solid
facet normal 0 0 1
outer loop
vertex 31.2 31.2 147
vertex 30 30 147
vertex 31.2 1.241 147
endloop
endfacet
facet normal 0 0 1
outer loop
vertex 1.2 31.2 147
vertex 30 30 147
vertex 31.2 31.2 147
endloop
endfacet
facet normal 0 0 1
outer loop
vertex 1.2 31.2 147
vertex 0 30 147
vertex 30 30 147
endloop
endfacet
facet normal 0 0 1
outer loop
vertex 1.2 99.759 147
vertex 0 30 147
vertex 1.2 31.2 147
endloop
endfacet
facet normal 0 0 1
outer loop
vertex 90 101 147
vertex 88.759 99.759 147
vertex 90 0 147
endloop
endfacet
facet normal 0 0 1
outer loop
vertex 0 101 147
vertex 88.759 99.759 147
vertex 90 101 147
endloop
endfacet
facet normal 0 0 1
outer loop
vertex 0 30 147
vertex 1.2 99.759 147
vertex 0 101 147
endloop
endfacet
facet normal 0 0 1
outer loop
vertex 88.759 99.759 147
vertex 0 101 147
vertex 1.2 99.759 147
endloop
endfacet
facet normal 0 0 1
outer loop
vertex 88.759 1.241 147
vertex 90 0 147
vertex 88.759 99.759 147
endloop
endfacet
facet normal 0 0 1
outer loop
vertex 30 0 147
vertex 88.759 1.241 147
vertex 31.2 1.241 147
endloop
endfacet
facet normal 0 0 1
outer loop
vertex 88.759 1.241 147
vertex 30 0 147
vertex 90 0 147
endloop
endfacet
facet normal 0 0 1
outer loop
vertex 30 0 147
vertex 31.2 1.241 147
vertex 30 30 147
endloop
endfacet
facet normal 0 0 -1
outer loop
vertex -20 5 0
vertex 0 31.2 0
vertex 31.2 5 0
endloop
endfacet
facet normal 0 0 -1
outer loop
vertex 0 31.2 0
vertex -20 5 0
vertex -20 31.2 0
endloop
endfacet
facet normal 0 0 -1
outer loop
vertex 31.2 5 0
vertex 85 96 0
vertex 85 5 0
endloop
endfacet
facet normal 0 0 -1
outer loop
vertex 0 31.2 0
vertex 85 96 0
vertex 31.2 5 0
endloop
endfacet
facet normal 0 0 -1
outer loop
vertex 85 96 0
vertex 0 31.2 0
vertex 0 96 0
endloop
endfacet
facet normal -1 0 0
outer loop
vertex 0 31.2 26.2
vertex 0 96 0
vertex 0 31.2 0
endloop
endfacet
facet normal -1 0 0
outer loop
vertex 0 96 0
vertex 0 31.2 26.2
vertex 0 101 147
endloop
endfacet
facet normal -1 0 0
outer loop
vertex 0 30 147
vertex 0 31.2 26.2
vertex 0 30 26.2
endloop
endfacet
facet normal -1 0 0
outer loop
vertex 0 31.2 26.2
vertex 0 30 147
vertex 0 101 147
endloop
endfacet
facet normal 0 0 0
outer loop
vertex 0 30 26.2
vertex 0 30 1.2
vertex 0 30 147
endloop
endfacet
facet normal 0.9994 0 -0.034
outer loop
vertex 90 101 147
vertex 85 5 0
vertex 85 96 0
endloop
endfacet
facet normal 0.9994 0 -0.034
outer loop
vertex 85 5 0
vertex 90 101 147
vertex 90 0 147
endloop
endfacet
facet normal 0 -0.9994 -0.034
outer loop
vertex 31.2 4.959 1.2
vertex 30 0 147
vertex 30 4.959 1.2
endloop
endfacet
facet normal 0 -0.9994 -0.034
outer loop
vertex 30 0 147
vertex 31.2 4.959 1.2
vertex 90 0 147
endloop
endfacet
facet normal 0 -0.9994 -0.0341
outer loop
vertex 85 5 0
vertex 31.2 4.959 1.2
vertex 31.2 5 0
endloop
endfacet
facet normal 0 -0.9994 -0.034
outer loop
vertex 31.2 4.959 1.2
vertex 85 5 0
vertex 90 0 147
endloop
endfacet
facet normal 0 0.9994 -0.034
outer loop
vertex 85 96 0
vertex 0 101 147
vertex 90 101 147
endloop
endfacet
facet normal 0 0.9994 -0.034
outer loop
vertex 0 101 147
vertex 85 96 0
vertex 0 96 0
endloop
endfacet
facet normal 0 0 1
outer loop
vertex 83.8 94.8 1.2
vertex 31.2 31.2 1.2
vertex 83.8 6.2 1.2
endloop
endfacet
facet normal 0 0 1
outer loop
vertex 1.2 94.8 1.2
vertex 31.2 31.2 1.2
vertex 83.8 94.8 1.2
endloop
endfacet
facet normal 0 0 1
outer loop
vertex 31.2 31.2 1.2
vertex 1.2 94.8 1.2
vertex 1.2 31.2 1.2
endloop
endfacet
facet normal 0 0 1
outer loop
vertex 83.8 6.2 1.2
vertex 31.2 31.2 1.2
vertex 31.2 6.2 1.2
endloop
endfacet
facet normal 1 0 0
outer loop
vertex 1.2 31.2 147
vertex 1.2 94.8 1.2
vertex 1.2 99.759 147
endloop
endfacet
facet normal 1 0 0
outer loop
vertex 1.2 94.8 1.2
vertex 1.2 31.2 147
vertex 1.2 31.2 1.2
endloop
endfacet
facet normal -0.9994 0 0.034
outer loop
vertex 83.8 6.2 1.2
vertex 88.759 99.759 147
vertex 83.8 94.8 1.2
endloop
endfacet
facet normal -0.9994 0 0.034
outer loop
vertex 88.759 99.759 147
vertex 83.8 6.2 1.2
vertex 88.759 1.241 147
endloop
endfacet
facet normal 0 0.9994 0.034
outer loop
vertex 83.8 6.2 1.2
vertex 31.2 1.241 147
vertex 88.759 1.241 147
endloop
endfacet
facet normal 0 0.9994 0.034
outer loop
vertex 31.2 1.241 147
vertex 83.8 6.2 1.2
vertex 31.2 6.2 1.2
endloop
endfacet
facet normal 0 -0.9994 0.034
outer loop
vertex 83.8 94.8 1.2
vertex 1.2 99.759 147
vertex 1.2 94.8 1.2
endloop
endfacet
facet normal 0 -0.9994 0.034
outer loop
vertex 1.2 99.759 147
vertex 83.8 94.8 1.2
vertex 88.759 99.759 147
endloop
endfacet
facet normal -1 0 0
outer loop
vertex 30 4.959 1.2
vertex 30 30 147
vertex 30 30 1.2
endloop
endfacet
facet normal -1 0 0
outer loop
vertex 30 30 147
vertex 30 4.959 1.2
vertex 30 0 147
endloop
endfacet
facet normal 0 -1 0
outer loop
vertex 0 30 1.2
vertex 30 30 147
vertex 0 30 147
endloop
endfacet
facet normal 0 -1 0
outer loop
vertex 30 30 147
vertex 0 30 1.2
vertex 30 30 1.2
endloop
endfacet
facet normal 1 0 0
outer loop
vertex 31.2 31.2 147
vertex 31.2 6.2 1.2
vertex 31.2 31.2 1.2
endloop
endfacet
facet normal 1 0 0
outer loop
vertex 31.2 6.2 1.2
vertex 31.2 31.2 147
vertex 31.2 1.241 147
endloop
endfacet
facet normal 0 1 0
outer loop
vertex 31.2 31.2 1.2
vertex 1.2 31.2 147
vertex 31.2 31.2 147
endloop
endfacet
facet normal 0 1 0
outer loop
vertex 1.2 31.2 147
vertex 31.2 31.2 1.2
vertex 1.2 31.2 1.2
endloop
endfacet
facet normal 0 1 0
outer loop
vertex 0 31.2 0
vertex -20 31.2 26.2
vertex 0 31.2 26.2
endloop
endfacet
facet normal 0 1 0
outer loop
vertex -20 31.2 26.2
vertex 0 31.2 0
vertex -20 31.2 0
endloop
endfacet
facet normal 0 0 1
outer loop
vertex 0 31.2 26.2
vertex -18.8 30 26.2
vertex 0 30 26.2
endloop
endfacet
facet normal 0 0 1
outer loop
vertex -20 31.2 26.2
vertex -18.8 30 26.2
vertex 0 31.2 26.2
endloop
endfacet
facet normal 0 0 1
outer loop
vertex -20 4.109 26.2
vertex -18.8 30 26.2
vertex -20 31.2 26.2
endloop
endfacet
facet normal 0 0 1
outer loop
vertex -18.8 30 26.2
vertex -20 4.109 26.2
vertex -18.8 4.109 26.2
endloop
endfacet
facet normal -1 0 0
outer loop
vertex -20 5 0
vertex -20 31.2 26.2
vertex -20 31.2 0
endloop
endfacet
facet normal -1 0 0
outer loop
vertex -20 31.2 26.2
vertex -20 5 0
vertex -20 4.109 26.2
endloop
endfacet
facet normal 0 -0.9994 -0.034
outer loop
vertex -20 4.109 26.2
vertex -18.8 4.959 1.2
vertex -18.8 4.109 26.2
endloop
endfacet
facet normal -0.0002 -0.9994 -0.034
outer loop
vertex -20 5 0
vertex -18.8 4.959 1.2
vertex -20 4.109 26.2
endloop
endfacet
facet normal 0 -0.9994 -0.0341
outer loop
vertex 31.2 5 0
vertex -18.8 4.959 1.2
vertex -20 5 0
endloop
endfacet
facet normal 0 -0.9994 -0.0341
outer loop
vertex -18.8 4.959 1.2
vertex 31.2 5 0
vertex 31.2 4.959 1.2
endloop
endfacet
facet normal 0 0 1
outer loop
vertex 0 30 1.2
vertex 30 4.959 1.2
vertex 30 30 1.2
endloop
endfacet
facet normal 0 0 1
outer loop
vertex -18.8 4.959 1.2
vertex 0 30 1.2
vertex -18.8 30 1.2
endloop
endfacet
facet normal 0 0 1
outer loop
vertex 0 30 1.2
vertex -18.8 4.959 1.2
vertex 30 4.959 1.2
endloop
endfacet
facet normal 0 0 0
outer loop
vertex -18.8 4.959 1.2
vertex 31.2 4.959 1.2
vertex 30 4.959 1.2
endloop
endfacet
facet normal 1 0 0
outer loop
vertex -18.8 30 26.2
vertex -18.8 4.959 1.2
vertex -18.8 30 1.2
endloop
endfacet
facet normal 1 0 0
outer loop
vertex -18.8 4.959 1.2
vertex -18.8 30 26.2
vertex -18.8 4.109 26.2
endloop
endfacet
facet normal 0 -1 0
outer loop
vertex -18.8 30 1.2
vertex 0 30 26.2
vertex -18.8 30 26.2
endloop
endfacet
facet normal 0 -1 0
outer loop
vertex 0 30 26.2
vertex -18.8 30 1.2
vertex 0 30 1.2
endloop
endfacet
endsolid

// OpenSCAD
box_w_bottom=91;
//box_delta=10;
//box_w_top=box_w_bottom+box_delta*2;
box_w_top=101;
box_delta=(box_w_top-box_w_bottom)/2;
box_h=147;
box_l_bottom=85;
box_l_top=box_l_bottom+box_delta;
box_angle=atan(box_delta/box_h);
pad=0.1;
padd=pad*2;

gun_w=30;
gun_l_to_front=55;
gun_l=box_l_bottom-gun_l_to_front;

wall=1.2;

muzzle_w=gun_w-wall;
muzzle_l=50;
muzzle_h=25;


module angled_box(this_l,this_w,this_h) {
    difference() {
        cube([this_l,this_w,this_h]);
        //front angle
        translate([this_l-box_delta,-pad,0])
        rotate([0,box_angle,0])
        cube([box_delta*2,this_w+padd,this_h*2]);
        //near side
        translate([-pad,box_delta,0])
        rotate([box_angle,0,0])
        translate([0,-box_delta*2,0])
        cube([this_l+padd,box_delta*2,this_h*2]);
        //far side
        translate([-pad,this_w-box_delta,0])
        rotate([-box_angle,0,0])
        cube([this_l+padd,box_delta*2,this_h*2]);
    }
}

module gun(this_l,this_w,this_h) {
    difference() {
        cube([this_l,this_w,this_h]);
        //near side
        translate([-pad,box_delta,0])
        rotate([box_angle,0,0])
        translate([0,-box_delta*2,0])
        cube([this_l+padd,box_delta*2,this_h*2]);
    }
}

difference() {
    angled_box(box_l_top,box_w_top,box_h);
    translate([wall,wall,wall])
    angled_box(box_l_top-wall*2,box_w_top-wall*2,box_h-wall+pad);
    translate([-pad,-pad,-pad])
    gun(gun_l+pad,gun_w+pad,box_h+padd);
}
difference() {
    gun(gun_l+wall,gun_w+wall,box_h);
    translate([-pad,-pad,-pad])
    gun(gun_l+pad,gun_w+pad,box_h+padd);
}
translate([-muzzle_l+gun_l,0,0])
difference() {
    gun(muzzle_l+wall,muzzle_w+wall*2,muzzle_h+wall);
    translate([wall,-wall,wall])
    #gun(muzzle_l,muzzle_w+wall*2,muzzle_h+pad);
}
